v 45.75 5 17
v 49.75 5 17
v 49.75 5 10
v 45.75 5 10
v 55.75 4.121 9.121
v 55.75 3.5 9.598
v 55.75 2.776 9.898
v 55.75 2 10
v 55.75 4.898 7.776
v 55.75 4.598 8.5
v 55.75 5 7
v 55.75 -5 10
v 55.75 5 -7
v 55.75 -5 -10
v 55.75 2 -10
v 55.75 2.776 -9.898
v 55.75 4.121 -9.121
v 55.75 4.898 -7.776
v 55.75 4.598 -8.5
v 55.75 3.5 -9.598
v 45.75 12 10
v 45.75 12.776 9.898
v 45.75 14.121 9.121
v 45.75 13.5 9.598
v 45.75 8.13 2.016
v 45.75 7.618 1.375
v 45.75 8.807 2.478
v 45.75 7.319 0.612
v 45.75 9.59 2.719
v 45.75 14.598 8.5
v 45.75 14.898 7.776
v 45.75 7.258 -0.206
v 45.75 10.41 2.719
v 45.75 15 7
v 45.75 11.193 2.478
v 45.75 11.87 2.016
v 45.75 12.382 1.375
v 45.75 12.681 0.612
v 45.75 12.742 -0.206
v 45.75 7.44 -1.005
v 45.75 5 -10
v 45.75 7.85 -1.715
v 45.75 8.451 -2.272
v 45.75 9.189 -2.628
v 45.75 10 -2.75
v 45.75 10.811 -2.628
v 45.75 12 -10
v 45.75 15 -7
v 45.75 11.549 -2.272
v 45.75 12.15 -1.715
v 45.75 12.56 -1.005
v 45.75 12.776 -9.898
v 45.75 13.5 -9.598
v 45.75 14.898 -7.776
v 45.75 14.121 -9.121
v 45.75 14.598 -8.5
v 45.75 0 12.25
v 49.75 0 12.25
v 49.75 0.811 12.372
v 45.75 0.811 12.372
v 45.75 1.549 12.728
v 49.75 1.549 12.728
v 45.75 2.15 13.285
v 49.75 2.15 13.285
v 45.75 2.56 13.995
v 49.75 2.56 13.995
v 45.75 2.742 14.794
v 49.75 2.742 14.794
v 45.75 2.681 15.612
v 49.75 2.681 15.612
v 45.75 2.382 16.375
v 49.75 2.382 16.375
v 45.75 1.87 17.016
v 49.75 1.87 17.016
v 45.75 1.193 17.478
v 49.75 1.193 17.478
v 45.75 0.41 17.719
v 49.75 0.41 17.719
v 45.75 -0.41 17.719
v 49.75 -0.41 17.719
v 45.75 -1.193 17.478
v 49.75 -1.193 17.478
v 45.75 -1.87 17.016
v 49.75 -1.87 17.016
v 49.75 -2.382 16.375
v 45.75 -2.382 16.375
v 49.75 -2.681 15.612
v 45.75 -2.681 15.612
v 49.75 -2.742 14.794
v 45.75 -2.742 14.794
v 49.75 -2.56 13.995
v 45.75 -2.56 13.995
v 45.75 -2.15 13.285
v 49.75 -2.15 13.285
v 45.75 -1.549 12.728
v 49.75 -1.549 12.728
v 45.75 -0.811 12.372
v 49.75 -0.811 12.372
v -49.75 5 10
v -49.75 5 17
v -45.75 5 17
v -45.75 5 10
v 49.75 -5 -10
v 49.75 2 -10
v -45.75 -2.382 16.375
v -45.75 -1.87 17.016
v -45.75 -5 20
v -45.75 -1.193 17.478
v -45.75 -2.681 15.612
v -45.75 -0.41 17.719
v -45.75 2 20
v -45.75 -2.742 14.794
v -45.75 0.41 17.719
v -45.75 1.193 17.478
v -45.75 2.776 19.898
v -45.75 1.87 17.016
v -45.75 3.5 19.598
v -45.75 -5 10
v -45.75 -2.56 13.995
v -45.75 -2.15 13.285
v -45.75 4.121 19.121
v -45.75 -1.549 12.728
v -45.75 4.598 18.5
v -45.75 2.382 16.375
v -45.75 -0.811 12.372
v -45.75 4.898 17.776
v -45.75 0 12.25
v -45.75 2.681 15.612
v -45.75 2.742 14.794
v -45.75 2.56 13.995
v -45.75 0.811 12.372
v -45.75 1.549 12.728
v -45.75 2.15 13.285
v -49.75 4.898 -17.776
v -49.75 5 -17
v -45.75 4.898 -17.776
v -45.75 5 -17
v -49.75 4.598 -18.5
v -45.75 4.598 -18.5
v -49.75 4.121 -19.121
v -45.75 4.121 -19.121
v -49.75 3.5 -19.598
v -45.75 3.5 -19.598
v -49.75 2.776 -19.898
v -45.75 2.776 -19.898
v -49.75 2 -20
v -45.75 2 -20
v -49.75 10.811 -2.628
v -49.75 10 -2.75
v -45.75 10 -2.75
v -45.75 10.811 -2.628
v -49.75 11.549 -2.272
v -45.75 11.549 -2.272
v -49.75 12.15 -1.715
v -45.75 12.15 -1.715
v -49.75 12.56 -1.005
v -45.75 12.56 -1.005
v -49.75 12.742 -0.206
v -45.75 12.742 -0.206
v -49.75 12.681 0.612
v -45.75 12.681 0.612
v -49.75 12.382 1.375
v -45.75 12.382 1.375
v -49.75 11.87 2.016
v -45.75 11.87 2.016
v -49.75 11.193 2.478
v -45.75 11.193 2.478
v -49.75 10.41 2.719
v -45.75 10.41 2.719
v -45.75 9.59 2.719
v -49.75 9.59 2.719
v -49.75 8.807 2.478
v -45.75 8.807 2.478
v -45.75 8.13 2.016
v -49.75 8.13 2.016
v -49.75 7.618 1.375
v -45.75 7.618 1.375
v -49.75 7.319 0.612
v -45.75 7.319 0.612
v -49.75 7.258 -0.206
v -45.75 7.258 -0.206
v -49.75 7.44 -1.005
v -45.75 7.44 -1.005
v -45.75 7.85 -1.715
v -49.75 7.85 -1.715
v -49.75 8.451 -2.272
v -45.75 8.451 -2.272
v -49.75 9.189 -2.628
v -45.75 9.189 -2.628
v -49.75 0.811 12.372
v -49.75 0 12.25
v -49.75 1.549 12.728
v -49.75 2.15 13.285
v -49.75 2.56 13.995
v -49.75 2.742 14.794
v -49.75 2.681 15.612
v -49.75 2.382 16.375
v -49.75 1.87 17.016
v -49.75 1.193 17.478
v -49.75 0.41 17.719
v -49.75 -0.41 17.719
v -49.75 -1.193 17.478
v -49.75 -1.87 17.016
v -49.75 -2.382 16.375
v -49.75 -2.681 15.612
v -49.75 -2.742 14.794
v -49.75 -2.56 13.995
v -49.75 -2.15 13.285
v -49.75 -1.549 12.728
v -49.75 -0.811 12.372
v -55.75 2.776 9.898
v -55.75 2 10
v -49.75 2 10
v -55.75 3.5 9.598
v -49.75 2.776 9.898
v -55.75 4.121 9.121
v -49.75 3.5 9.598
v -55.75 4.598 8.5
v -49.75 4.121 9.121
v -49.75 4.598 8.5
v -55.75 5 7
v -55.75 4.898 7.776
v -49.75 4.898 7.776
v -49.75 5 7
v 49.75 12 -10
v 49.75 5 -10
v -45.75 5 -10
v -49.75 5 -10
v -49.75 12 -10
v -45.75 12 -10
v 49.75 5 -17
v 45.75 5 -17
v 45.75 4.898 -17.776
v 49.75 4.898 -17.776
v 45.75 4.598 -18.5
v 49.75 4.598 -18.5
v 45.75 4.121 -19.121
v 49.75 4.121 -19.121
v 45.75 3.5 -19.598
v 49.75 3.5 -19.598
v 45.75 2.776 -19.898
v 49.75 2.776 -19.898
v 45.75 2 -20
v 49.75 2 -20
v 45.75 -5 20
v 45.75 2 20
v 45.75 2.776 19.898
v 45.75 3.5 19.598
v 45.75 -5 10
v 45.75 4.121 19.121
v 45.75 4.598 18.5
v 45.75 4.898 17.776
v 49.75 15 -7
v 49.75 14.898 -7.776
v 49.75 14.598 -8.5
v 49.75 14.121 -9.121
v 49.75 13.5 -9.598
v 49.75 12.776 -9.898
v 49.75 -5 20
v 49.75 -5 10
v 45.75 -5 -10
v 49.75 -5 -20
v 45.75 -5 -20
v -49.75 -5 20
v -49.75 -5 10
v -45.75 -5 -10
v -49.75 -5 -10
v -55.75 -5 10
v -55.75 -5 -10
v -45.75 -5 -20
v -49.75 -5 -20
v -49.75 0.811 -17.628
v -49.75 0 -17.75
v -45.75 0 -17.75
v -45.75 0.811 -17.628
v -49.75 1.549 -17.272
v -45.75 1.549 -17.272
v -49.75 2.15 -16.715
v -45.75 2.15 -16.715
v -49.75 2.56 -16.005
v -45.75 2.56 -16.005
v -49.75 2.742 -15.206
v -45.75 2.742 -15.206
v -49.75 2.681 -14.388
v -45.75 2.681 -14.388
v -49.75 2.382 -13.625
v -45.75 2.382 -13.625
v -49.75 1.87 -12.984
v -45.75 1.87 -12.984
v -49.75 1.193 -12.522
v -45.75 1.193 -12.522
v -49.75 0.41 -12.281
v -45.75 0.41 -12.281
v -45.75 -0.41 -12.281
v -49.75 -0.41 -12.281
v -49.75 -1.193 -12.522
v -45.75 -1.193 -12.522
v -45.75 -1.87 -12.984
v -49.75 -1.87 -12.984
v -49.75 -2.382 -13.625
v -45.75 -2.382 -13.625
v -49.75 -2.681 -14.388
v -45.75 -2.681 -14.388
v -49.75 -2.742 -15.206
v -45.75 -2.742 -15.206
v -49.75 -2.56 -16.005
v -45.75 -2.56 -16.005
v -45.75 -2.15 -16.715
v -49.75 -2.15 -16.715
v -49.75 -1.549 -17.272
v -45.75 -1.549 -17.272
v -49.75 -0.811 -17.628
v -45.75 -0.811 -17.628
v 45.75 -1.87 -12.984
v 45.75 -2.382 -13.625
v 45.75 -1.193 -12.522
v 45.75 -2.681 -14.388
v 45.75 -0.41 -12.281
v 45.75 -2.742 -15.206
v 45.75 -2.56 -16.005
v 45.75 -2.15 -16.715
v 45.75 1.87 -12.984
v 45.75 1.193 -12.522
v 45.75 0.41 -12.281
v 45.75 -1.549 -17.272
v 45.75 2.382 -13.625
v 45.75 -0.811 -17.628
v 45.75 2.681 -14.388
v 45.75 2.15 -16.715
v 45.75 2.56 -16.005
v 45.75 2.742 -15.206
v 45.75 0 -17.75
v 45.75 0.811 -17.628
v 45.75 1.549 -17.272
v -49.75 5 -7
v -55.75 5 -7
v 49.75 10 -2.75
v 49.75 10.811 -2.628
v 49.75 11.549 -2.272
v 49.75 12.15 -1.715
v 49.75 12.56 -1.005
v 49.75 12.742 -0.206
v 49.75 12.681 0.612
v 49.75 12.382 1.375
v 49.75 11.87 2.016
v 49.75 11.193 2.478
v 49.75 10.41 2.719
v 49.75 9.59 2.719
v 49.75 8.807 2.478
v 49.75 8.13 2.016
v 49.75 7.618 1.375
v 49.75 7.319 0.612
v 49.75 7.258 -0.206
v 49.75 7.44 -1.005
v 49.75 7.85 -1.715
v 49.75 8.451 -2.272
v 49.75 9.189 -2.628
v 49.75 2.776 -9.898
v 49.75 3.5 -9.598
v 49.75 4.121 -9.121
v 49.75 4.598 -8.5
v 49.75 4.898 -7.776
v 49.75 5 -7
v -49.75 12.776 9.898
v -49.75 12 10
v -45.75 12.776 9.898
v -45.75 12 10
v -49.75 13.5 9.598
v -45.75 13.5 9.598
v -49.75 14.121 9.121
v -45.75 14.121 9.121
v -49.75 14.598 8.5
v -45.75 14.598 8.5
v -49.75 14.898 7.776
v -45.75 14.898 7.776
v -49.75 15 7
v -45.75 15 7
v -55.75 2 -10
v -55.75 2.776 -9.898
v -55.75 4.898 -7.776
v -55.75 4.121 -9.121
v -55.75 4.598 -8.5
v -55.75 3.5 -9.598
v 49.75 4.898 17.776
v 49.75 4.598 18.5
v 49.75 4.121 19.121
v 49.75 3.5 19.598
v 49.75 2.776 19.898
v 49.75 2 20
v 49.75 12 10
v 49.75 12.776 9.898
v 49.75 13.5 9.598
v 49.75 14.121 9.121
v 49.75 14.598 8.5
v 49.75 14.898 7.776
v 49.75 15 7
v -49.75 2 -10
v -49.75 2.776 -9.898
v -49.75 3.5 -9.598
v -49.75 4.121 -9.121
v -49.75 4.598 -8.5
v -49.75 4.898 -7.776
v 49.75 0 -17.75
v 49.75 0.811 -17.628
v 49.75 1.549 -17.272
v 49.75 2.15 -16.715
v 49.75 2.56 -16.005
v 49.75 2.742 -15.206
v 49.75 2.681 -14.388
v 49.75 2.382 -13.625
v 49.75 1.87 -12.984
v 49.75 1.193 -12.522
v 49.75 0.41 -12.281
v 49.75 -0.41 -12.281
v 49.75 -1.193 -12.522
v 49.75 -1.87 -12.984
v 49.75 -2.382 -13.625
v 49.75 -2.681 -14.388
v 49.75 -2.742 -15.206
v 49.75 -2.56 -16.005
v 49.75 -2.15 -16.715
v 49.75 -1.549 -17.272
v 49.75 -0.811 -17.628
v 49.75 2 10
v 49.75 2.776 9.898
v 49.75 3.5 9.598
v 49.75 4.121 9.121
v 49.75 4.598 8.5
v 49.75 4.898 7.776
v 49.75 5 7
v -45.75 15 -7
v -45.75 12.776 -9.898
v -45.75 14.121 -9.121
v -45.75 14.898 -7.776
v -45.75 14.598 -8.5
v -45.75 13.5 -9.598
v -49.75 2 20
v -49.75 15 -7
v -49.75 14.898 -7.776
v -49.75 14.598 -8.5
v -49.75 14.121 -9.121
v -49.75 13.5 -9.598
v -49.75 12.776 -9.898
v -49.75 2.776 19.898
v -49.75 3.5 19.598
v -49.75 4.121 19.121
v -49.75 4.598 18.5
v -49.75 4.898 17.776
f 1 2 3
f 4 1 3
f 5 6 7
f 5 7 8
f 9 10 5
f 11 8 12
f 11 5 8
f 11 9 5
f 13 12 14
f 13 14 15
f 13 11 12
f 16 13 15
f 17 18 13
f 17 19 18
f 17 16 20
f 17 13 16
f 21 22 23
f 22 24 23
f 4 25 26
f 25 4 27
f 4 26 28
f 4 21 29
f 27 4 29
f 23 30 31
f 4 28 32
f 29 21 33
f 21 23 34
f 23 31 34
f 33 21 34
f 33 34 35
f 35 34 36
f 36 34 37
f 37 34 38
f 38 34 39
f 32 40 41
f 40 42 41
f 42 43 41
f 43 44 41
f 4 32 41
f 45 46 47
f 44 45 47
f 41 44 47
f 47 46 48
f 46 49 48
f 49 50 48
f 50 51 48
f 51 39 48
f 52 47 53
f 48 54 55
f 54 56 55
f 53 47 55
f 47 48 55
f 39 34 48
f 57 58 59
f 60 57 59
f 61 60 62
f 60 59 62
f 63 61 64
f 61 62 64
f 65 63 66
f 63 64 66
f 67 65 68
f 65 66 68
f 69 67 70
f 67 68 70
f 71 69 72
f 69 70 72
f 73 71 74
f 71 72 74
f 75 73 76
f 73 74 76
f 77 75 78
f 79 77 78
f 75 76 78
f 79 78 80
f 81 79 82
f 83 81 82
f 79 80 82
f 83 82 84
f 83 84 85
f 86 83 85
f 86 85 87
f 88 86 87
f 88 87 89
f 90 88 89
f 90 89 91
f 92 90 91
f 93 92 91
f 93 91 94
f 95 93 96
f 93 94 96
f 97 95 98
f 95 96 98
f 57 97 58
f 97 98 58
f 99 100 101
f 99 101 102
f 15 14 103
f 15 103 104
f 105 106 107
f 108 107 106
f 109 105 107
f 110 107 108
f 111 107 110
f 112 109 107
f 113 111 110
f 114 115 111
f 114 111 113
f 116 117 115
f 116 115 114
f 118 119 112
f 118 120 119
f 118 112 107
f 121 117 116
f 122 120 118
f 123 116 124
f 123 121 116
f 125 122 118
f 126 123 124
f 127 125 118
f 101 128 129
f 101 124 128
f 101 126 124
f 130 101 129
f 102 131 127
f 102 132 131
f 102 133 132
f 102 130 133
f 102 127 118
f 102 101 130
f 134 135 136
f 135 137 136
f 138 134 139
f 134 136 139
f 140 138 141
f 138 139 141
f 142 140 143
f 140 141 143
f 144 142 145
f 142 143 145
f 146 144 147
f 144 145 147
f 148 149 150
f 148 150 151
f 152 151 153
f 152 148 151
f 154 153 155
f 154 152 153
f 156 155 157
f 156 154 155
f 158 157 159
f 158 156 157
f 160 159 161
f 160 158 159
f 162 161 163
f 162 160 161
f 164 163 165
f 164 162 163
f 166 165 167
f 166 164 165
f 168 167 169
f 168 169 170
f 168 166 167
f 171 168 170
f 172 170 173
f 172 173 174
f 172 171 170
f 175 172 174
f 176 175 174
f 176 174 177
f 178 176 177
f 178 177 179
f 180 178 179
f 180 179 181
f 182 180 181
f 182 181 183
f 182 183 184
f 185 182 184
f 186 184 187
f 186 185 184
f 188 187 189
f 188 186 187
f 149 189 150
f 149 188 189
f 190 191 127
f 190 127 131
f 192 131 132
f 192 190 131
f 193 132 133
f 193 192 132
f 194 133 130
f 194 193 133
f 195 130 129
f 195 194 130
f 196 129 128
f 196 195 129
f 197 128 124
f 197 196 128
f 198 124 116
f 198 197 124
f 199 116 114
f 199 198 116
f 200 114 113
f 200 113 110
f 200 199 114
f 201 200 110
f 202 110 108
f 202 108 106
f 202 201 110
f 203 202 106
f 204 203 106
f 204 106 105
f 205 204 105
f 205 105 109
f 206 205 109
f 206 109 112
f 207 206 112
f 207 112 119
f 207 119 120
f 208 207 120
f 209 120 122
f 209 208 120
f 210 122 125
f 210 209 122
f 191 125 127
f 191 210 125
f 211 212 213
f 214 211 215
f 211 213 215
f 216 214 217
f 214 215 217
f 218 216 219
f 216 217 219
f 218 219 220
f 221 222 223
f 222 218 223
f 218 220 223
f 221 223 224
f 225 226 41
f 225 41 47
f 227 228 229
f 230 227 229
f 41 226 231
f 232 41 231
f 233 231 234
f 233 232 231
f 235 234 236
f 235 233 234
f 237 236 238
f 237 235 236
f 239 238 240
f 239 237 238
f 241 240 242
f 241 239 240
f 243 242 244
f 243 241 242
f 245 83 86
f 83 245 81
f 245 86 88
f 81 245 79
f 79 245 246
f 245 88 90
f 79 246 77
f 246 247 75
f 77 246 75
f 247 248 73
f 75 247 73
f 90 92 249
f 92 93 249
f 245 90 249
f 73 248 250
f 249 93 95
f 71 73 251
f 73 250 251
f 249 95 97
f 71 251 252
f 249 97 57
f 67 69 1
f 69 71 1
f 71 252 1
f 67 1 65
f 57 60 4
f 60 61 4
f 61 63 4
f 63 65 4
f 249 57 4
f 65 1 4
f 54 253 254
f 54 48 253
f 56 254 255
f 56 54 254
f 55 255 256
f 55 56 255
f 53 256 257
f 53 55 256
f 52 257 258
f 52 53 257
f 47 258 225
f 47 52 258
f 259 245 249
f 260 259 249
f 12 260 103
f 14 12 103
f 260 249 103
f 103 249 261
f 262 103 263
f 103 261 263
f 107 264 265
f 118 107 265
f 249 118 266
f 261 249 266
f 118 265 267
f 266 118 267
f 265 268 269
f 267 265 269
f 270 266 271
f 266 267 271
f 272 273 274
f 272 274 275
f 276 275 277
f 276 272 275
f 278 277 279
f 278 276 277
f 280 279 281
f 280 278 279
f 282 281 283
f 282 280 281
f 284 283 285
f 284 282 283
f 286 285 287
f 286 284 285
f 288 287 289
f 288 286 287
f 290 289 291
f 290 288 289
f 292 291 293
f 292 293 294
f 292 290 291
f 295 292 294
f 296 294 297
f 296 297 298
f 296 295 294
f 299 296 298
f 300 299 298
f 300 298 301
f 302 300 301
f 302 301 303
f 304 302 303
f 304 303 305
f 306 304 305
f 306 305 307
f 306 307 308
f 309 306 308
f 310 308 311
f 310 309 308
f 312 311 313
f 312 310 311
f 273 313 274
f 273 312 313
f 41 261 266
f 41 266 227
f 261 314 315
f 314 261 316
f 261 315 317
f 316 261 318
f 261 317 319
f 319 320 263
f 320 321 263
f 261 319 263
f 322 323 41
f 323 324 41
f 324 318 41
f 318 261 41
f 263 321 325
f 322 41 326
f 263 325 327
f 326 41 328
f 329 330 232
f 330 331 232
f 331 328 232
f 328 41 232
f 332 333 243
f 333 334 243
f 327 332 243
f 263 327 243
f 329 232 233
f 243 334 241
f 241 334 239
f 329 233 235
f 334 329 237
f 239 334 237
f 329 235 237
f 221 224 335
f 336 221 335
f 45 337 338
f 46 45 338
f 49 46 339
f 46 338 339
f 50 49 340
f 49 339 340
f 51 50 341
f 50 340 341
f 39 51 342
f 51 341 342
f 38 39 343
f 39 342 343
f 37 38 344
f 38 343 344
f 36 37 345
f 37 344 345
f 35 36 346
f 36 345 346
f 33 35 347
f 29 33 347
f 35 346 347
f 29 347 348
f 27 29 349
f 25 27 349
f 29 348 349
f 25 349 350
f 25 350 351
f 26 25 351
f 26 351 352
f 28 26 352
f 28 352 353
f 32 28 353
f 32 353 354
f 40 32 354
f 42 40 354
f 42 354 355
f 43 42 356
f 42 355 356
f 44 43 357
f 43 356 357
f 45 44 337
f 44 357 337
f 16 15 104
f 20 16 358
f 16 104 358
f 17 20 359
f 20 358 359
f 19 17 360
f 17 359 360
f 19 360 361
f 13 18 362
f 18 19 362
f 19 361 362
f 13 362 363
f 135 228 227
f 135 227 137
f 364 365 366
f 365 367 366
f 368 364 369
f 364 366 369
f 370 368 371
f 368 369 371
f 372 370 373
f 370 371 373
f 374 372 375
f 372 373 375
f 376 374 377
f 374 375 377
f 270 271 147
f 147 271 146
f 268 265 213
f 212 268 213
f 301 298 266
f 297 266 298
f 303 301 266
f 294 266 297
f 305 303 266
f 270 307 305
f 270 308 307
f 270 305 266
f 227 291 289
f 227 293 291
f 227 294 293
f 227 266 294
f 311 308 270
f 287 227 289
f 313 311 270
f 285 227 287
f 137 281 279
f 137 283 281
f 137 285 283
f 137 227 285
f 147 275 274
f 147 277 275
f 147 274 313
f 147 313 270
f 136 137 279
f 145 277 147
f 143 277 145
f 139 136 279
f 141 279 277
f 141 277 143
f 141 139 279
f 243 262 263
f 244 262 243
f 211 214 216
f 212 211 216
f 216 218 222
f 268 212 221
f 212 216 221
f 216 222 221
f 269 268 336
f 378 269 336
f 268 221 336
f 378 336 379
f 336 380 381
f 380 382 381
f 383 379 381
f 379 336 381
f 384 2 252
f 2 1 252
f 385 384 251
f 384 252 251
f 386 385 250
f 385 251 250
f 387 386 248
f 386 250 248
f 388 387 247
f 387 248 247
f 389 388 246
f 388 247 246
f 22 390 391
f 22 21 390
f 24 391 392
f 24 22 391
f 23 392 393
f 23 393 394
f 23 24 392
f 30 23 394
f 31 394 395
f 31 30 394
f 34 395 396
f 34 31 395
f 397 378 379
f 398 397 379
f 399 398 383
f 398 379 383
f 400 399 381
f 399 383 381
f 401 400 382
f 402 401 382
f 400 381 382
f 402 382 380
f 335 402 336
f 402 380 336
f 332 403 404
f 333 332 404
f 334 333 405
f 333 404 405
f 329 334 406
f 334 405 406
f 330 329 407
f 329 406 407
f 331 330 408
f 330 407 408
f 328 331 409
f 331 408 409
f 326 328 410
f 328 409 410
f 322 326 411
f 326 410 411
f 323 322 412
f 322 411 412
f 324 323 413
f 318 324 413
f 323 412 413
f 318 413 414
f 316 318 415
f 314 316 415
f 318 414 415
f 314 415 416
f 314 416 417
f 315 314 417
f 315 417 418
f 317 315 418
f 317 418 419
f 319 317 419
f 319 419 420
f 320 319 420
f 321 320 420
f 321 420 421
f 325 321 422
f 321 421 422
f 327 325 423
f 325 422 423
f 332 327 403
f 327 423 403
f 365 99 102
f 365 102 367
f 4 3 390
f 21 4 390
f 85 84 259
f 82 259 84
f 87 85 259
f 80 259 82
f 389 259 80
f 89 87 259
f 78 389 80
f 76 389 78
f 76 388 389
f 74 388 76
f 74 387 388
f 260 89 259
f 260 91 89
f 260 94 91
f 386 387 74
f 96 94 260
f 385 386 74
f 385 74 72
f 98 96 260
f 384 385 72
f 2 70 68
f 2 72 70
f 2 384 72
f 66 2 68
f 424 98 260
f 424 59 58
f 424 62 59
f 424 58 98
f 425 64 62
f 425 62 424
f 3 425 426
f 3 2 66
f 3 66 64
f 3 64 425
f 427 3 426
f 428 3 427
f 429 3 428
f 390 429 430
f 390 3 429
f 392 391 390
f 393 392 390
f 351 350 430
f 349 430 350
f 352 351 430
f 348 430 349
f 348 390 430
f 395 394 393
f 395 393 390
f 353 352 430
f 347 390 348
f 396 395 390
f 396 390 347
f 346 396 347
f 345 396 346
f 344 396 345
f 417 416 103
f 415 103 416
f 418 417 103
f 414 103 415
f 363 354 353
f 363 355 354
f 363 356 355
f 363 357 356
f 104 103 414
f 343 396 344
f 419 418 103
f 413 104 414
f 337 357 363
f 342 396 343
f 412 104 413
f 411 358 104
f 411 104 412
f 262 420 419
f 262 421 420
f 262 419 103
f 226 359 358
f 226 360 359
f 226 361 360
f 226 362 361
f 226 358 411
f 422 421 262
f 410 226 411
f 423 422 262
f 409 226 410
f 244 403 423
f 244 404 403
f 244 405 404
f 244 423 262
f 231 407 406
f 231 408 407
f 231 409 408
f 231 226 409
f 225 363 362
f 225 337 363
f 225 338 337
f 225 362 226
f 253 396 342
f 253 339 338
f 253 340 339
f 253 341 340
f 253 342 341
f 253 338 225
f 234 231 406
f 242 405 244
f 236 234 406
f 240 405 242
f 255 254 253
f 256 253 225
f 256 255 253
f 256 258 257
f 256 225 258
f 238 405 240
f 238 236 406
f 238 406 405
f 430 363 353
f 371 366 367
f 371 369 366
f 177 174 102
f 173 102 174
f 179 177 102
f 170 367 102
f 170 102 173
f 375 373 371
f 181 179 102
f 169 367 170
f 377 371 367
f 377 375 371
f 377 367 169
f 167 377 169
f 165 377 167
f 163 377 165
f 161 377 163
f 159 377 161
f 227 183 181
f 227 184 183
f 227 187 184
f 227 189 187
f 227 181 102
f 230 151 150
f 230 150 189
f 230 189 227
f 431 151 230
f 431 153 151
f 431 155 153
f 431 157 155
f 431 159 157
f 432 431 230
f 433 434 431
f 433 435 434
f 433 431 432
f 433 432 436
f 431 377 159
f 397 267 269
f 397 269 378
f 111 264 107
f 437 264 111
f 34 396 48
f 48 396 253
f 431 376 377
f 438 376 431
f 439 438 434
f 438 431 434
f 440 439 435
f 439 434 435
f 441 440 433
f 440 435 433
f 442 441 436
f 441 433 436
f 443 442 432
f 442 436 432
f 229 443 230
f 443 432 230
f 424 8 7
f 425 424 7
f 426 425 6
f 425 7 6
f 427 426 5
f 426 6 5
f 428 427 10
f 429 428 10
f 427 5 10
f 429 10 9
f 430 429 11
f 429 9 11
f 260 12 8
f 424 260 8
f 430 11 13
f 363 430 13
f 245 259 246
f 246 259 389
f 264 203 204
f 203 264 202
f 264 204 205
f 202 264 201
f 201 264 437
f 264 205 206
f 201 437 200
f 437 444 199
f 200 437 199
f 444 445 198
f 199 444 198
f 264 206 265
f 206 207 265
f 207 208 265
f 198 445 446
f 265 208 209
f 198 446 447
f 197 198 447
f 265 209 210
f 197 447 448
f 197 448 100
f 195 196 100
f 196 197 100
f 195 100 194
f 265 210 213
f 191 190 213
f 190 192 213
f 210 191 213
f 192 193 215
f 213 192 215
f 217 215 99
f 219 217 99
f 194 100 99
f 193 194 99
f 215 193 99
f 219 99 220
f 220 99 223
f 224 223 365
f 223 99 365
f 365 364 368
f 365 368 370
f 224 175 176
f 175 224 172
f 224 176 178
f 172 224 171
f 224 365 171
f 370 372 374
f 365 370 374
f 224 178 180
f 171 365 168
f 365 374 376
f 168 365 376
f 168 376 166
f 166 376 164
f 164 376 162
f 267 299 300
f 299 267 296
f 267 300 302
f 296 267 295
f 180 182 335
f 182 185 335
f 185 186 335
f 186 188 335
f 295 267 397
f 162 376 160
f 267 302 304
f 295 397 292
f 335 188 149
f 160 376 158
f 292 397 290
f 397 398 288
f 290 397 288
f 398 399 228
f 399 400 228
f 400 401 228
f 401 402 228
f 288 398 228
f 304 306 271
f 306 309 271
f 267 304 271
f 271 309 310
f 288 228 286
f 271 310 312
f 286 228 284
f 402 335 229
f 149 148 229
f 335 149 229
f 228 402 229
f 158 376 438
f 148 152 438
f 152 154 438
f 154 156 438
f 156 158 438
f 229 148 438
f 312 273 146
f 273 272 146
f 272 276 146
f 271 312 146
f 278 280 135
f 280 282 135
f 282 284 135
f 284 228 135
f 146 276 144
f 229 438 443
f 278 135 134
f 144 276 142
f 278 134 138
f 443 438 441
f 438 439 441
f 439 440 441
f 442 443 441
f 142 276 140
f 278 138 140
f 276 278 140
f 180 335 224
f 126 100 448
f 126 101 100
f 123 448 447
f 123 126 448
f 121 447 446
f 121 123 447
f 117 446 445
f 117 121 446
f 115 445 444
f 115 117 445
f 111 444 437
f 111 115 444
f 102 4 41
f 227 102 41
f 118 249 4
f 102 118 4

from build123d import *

# Parameters (mm, degrees)
SKETCH_2_W             = 20
SKETCH_2_H             = 10
EXTRUDE_1_DEPTH        = 55.75
SKETCH_3_W             = 20
SKETCH_3_H             = 10
SKETCH_3_R             = 2.75
SKETCH_3_W_2           = 10
EXTRUDE_2_DEPTH        = 4
FILLET_1_R             = 3
FILLET_1_OF_MIRROR_1_R = 3
FILLET_2_R             = 3


with BuildPart() as part:
    # 草图2 → 凸台-拉伸1 (new, symmetric)
    with BuildSketch(Plane(origin=(0, 0, 0), x_dir=(0, 0, -1), z_dir=(1, 0, 0))):
        Rectangle(SKETCH_2_W, SKETCH_2_H)
    extrude(amount=EXTRUDE_1_DEPTH, both=True)

    # 草图3 → 凸台-拉伸2 (add)
    # profile 1 of 3: a face of its own
    with BuildSketch(Plane(origin=(49.75, 0, 0), x_dir=(0, 0, -1), z_dir=(1, 0, 0))):
        with Locations((0, 10)):
            Rectangle(SKETCH_3_W, SKETCH_3_H)
        with Locations((0, 10)):
            Circle(SKETCH_3_R, mode=Mode.SUBTRACT)
    # profile 2 of 3: a face of its own
    with BuildSketch(Plane(origin=(49.75, 0, 0), x_dir=(0, 0, -1), z_dir=(1, 0, 0))):
        with Locations((15, 0)):
            Rectangle(SKETCH_3_W_2, SKETCH_3_H)
        with Locations((15, 0)):
            Circle(SKETCH_3_R, mode=Mode.SUBTRACT)
    # profile 3 of 3: a face of its own
    with BuildSketch(Plane(origin=(49.75, 0, 0), x_dir=(0, 0, -1), z_dir=(1, 0, 0))):
        with Locations((-15, 0)):
            Rectangle(SKETCH_3_W_2, SKETCH_3_H)
        with Locations((-15, 0)):
            Circle(SKETCH_3_R, mode=Mode.SUBTRACT)
    extrude_2 = extrude(amount=-EXTRUDE_2_DEPTH)

    # 圆角1
    fillet_1_edges = [part.edges().sort_by_distance(p)[0] for p in [
        (47.75, 15, 10),
        (47.75, 15, -10),
        (47.75, 5, -20),
        (47.75, 5, 20),
    ]]
    fillet(fillet_1_edges, radius=FILLET_1_R)

    # 镜向1: 凸台-拉伸2 across plane
    add(extrude_2.mirror(Plane(origin=(0, 0, 0), x_dir=(0, 0, 1), z_dir=(1, 0, 0))))

    # 圆角1 of 镜向1
    fillet_1_of_mirror_1_edges = [part.edges().sort_by_distance(p)[0] for p in [
        (-47.75, 15, 10),
        (-47.75, 15, -10),
        (-47.75, 5, -20),
        (-47.75, 5, 20),
    ]]
    fillet(fillet_1_of_mirror_1_edges, radius=FILLET_1_OF_MIRROR_1_R)

    # 圆角2
    # the kernel refuses this fillet: 3 mm, written as the material it takes off along each edge
    with BuildSketch(Plane(origin=(63.25, 5, 10), x_dir=(0, -1, 0), z_dir=(-1, 0, 0)), Plane(origin=(49.75, 5, -10), x_dir=(0, -1, 0), z_dir=(1, 0, 0)), Plane(origin=(-49.75, 5, 10), x_dir=(0, -1, 0), z_dir=(-1, 0, 0)), Plane(origin=(-63.25, 5, -10), x_dir=(0, -1, 0), z_dir=(1, 0, 0))) as fillet_2_piece_1:
        with BuildLine():
            CenterArc((FILLET_2_R, -FILLET_2_R), FILLET_2_R, 90, 90)
            Line((0, -FILLET_2_R), (0, 0))
            Line((0, 0), (FILLET_2_R, 0))
        make_face()
    extrude(amount=13.5, mode=Mode.SUBTRACT)


solid = part.part
